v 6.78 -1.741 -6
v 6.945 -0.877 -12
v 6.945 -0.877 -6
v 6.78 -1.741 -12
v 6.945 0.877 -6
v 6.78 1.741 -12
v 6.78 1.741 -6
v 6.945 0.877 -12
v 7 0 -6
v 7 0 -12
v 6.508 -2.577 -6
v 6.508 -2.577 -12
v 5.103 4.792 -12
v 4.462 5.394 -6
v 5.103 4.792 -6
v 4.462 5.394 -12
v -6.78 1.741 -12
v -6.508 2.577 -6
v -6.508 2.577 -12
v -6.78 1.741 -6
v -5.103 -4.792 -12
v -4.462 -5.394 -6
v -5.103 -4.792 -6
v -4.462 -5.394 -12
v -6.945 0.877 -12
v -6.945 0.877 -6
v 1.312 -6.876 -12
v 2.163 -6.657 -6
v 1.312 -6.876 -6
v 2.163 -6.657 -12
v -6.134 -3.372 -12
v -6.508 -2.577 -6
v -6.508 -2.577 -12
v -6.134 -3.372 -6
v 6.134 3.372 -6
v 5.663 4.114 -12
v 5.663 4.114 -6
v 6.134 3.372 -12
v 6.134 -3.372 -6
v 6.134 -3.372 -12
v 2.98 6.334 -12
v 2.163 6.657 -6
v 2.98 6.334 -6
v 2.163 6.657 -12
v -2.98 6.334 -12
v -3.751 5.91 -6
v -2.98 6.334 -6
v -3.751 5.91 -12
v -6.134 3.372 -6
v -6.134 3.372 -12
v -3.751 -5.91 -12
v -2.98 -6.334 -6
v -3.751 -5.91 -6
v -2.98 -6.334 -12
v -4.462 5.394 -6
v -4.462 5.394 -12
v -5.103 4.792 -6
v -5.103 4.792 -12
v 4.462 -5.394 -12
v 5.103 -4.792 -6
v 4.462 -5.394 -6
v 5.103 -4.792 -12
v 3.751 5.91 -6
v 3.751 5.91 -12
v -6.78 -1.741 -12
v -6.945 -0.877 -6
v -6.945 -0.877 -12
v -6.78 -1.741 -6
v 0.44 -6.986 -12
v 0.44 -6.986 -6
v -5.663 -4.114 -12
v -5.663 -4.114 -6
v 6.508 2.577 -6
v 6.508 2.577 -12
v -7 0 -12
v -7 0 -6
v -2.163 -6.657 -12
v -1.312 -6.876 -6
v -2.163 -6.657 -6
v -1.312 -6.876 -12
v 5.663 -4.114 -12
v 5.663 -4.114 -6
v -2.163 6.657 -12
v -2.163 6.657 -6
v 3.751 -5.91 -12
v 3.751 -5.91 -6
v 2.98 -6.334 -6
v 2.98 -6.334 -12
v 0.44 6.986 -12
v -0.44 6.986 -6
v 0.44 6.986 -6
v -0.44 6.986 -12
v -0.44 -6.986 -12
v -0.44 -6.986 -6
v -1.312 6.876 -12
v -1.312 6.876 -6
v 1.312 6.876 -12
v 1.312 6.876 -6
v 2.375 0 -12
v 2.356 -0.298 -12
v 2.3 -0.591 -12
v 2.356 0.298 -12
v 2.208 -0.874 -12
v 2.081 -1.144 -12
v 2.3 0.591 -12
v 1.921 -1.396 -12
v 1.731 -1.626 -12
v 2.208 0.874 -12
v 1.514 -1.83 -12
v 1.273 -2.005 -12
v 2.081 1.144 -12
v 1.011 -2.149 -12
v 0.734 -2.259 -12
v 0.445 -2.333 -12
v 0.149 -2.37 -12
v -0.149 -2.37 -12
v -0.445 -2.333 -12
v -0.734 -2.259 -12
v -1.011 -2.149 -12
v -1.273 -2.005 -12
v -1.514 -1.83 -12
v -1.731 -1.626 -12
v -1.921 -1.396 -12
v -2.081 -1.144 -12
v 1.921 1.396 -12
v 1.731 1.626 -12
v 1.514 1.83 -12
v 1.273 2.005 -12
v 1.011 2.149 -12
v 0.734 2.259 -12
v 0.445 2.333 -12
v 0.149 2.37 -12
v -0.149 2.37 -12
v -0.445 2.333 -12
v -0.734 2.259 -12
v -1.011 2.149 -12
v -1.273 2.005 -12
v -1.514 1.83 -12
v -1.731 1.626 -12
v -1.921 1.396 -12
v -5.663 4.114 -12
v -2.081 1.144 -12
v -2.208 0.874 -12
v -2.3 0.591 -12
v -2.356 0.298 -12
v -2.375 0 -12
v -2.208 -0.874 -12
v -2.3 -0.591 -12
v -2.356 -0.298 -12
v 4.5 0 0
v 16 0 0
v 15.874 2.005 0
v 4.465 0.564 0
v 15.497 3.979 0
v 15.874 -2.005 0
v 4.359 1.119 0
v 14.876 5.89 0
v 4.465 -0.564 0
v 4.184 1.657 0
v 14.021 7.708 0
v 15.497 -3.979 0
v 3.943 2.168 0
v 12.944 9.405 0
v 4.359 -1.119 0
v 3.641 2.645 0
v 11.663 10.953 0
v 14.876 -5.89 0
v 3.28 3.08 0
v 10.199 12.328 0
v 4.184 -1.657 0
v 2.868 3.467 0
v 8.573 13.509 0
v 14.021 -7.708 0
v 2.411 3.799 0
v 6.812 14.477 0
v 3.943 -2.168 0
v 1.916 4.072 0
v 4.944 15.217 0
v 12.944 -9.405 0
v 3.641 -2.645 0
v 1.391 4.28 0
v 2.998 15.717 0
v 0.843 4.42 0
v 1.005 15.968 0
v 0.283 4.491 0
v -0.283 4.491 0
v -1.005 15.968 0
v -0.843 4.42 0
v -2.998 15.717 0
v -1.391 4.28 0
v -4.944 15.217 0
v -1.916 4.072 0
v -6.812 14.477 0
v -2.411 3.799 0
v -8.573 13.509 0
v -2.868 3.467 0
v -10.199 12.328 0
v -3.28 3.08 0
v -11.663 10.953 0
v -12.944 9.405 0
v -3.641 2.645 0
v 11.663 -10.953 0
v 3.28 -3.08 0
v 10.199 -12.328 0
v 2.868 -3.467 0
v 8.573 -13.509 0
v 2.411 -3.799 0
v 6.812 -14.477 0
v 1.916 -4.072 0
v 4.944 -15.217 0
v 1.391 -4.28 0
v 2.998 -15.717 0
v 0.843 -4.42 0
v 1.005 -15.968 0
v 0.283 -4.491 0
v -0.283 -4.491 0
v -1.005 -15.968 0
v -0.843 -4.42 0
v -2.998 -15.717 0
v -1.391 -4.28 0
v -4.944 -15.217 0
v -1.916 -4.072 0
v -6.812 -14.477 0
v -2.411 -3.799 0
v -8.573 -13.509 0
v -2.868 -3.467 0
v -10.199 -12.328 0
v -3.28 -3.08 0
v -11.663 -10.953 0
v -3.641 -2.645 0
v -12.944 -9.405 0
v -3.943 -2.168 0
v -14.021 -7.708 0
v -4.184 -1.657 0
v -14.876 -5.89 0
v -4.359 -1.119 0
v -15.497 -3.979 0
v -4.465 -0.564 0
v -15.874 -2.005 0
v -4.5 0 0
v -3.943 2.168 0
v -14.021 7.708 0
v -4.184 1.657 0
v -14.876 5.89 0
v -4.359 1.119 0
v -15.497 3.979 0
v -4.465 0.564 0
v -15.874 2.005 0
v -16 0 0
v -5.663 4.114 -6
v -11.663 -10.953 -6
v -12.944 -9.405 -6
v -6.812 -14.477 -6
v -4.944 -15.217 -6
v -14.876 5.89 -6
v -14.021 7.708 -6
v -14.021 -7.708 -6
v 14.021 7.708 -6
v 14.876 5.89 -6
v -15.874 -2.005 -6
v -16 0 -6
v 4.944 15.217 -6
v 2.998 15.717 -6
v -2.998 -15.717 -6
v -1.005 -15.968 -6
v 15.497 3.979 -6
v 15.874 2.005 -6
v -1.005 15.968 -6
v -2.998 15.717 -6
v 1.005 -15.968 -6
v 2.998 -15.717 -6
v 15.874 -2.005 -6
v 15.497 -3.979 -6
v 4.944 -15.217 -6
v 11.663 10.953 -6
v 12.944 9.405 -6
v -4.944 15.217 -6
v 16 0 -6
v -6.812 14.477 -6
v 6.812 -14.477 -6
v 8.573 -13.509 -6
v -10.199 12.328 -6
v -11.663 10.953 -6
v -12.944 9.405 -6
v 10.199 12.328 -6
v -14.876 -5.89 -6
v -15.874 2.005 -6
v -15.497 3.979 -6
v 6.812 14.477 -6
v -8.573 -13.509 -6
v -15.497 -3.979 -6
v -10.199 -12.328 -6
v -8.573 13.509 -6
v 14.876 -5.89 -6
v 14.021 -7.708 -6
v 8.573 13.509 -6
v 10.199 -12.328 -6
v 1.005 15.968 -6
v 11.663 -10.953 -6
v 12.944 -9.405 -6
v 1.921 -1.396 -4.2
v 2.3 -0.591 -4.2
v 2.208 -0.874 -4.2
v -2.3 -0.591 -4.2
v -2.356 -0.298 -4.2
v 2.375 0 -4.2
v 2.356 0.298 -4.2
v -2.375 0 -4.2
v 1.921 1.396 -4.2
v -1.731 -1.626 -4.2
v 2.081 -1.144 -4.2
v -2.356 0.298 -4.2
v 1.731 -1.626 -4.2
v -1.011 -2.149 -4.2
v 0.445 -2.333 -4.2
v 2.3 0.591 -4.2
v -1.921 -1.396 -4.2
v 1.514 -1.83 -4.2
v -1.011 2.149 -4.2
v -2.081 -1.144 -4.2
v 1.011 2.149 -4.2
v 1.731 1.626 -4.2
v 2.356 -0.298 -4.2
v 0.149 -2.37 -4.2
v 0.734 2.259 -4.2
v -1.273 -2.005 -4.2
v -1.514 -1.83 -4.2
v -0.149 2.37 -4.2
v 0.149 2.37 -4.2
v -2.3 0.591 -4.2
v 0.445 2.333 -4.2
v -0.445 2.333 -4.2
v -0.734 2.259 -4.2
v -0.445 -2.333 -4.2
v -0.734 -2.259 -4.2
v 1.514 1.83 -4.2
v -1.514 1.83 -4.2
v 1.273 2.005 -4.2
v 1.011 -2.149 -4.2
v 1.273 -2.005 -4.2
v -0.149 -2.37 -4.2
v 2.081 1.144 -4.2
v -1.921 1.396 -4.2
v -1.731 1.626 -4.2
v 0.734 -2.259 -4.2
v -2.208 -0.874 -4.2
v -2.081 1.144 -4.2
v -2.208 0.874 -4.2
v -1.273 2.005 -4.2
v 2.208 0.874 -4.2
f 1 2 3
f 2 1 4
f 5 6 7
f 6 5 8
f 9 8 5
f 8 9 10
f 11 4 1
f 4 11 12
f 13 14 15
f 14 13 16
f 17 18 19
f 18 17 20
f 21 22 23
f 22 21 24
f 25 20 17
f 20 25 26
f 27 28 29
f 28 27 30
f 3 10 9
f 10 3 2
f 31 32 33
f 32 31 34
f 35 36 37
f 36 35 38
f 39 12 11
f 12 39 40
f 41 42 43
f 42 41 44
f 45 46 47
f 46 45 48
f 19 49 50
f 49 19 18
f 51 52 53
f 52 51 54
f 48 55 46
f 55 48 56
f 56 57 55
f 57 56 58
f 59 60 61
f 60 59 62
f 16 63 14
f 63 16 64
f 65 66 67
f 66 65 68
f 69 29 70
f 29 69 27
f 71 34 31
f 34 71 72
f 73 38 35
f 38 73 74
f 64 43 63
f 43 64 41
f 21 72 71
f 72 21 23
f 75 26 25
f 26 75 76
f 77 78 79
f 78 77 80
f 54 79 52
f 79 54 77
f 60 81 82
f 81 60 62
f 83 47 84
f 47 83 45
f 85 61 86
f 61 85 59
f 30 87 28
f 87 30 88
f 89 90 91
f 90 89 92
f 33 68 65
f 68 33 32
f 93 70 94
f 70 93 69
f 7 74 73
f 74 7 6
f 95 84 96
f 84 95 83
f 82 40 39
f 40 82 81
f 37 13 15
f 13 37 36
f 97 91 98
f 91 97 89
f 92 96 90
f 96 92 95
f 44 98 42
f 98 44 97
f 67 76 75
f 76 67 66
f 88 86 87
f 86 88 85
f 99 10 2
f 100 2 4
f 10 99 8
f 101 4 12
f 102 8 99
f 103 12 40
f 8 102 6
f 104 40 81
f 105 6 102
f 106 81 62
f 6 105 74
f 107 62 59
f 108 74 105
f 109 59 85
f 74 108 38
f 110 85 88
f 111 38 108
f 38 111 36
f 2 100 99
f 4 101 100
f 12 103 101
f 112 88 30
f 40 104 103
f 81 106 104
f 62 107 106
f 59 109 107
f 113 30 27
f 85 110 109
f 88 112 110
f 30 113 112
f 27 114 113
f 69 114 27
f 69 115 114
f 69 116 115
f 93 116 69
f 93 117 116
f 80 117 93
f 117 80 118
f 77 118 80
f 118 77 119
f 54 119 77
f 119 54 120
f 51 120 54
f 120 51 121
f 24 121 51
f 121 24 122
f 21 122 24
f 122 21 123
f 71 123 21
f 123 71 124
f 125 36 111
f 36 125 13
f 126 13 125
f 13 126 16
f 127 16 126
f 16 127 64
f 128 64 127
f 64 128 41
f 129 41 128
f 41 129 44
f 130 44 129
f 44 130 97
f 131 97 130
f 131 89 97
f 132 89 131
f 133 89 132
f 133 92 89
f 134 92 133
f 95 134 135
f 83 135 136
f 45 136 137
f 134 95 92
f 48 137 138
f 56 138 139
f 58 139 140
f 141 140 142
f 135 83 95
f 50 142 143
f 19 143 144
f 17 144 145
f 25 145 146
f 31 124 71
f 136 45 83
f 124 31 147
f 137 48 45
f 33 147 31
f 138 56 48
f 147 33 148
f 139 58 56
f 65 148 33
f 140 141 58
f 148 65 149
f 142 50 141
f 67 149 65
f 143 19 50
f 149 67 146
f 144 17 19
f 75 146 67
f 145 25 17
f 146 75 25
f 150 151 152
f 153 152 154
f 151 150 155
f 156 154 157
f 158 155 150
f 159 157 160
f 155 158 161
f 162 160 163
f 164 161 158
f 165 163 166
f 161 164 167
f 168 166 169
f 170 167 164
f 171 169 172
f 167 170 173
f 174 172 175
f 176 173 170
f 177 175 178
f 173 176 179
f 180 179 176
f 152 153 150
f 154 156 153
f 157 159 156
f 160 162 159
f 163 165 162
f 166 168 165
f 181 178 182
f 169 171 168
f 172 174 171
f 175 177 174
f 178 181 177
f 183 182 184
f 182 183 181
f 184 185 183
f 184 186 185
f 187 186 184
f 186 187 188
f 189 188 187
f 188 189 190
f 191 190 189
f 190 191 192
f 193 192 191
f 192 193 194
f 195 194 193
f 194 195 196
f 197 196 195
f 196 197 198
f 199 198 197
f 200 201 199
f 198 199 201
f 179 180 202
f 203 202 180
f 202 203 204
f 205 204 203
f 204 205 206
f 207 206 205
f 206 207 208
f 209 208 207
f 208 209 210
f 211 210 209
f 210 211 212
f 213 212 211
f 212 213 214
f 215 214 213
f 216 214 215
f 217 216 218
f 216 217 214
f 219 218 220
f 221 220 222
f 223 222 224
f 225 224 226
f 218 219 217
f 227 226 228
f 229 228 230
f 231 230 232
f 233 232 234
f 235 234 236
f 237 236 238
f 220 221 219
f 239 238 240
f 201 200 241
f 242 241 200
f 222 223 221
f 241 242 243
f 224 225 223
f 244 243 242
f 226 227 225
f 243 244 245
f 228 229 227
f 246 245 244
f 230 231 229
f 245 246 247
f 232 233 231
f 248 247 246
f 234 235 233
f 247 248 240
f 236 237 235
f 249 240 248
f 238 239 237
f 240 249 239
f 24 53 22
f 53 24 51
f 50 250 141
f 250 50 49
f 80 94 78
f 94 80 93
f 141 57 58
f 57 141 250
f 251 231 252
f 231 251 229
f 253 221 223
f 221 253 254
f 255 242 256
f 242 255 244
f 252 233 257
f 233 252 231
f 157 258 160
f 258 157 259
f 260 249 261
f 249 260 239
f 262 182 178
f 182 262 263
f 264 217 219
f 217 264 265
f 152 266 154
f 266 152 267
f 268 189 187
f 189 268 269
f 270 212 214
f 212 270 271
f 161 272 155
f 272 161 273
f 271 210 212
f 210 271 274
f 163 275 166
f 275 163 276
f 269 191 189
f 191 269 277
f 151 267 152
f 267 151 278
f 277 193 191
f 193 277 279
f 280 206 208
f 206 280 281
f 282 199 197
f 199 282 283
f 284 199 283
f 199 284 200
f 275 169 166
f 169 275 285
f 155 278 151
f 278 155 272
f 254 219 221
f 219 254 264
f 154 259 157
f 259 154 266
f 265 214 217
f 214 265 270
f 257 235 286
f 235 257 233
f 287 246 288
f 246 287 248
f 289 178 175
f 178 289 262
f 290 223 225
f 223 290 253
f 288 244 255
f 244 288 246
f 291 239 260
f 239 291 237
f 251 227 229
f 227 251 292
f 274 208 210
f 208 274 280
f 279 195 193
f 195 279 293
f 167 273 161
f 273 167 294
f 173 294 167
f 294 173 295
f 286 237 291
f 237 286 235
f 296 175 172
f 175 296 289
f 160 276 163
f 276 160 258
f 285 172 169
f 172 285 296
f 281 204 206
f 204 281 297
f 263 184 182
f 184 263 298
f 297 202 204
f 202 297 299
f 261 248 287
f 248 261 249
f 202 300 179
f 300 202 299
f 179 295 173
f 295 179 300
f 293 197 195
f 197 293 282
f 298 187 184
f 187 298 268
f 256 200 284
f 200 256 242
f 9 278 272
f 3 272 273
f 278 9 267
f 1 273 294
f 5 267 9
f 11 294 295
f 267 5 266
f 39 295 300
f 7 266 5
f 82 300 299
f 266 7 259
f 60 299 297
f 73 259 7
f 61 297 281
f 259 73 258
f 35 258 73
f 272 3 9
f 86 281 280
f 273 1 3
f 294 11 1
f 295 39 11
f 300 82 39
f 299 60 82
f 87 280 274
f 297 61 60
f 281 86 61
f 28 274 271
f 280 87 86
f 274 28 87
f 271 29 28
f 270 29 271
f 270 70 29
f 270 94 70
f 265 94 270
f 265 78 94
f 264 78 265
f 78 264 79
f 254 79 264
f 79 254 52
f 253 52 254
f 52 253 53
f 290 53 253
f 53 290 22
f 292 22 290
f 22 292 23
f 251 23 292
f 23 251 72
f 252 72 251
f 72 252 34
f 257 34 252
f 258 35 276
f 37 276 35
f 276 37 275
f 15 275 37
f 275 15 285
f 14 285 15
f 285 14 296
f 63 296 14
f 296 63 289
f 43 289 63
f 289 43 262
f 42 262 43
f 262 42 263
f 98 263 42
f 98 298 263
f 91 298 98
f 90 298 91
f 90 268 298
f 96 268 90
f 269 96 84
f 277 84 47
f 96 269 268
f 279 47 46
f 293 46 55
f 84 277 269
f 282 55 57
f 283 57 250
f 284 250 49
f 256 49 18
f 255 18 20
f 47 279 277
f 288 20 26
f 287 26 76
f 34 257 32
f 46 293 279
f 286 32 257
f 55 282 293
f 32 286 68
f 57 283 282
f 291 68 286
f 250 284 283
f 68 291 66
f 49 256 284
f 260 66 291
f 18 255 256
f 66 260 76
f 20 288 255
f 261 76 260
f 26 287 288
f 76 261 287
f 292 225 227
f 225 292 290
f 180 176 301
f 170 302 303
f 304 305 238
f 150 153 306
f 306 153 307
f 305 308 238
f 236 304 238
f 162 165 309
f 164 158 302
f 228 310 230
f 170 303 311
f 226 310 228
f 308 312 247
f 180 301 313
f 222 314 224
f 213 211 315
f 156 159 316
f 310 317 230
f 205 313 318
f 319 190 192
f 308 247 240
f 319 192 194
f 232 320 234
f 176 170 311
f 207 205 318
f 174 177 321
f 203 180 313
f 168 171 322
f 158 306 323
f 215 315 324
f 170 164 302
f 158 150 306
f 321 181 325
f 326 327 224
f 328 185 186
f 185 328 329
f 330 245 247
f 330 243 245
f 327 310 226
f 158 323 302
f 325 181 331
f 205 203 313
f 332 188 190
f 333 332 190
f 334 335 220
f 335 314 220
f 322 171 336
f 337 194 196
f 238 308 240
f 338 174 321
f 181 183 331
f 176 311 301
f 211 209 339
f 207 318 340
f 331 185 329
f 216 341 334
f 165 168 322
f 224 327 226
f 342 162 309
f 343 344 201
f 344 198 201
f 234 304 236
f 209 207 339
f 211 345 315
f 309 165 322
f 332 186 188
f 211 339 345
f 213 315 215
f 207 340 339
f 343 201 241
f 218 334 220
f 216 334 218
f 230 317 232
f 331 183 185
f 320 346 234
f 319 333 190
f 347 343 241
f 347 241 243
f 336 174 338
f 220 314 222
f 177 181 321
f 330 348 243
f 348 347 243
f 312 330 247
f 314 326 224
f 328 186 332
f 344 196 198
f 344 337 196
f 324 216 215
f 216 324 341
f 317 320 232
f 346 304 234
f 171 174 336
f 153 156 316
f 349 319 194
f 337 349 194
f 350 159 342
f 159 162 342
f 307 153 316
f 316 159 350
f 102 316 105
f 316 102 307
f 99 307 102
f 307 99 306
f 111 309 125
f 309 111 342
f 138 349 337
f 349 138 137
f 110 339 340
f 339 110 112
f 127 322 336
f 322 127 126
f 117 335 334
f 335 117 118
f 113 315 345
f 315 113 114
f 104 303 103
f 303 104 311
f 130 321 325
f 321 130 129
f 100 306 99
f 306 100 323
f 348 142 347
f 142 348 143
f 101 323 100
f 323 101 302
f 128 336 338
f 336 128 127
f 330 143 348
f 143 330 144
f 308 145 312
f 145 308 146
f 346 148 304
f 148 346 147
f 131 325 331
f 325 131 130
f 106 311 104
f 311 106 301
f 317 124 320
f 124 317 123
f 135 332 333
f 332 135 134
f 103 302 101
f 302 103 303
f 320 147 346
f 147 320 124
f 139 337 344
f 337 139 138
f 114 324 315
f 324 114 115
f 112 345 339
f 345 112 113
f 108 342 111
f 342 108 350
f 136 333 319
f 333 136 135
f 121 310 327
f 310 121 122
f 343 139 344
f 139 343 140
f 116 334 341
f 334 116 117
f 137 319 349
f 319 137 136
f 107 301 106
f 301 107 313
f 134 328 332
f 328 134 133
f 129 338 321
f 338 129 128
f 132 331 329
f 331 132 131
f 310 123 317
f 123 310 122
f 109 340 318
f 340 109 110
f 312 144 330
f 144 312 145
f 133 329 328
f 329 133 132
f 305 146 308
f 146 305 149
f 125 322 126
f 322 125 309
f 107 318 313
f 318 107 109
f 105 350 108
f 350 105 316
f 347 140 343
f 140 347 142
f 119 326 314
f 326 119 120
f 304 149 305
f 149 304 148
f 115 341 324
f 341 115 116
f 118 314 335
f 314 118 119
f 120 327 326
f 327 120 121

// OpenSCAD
$fn = 50;


difference() {
	union() {
		translate(v = [0, 0, -12.0000000000]) {
			cylinder(h = 12, r = 7.0000000000);
		}
		translate(v = [0, 0, -6.0000000000]) {
			cylinder(h = 6, r = 16.0000000000);
		}
	}
	union() {
		translate(v = [0, 0, 0]) {
			rotate(a = [0, 0, 0]) {
				difference() {
					union() {
						#translate(v = [0, 0, -12.0000000000]) {
							cylinder(h = 12, r = 2.2500000000);
						}
						#translate(v = [0, 0, -4.2000000000]) {
							cylinder(h = 4.2000000000, r1 = 2.3750000000, r2 = 4.5000000000);
						}
						#translate(v = [0, 0, -12.0000000000]) {
							cylinder(h = 12, r = 2.3750000000);
						}
						#translate(v = [0, 0, -12.0000000000]) {
							cylinder(h = 12, r = 2.2500000000);
						}
					}
					union();
				}
			}
		}
	}
}
